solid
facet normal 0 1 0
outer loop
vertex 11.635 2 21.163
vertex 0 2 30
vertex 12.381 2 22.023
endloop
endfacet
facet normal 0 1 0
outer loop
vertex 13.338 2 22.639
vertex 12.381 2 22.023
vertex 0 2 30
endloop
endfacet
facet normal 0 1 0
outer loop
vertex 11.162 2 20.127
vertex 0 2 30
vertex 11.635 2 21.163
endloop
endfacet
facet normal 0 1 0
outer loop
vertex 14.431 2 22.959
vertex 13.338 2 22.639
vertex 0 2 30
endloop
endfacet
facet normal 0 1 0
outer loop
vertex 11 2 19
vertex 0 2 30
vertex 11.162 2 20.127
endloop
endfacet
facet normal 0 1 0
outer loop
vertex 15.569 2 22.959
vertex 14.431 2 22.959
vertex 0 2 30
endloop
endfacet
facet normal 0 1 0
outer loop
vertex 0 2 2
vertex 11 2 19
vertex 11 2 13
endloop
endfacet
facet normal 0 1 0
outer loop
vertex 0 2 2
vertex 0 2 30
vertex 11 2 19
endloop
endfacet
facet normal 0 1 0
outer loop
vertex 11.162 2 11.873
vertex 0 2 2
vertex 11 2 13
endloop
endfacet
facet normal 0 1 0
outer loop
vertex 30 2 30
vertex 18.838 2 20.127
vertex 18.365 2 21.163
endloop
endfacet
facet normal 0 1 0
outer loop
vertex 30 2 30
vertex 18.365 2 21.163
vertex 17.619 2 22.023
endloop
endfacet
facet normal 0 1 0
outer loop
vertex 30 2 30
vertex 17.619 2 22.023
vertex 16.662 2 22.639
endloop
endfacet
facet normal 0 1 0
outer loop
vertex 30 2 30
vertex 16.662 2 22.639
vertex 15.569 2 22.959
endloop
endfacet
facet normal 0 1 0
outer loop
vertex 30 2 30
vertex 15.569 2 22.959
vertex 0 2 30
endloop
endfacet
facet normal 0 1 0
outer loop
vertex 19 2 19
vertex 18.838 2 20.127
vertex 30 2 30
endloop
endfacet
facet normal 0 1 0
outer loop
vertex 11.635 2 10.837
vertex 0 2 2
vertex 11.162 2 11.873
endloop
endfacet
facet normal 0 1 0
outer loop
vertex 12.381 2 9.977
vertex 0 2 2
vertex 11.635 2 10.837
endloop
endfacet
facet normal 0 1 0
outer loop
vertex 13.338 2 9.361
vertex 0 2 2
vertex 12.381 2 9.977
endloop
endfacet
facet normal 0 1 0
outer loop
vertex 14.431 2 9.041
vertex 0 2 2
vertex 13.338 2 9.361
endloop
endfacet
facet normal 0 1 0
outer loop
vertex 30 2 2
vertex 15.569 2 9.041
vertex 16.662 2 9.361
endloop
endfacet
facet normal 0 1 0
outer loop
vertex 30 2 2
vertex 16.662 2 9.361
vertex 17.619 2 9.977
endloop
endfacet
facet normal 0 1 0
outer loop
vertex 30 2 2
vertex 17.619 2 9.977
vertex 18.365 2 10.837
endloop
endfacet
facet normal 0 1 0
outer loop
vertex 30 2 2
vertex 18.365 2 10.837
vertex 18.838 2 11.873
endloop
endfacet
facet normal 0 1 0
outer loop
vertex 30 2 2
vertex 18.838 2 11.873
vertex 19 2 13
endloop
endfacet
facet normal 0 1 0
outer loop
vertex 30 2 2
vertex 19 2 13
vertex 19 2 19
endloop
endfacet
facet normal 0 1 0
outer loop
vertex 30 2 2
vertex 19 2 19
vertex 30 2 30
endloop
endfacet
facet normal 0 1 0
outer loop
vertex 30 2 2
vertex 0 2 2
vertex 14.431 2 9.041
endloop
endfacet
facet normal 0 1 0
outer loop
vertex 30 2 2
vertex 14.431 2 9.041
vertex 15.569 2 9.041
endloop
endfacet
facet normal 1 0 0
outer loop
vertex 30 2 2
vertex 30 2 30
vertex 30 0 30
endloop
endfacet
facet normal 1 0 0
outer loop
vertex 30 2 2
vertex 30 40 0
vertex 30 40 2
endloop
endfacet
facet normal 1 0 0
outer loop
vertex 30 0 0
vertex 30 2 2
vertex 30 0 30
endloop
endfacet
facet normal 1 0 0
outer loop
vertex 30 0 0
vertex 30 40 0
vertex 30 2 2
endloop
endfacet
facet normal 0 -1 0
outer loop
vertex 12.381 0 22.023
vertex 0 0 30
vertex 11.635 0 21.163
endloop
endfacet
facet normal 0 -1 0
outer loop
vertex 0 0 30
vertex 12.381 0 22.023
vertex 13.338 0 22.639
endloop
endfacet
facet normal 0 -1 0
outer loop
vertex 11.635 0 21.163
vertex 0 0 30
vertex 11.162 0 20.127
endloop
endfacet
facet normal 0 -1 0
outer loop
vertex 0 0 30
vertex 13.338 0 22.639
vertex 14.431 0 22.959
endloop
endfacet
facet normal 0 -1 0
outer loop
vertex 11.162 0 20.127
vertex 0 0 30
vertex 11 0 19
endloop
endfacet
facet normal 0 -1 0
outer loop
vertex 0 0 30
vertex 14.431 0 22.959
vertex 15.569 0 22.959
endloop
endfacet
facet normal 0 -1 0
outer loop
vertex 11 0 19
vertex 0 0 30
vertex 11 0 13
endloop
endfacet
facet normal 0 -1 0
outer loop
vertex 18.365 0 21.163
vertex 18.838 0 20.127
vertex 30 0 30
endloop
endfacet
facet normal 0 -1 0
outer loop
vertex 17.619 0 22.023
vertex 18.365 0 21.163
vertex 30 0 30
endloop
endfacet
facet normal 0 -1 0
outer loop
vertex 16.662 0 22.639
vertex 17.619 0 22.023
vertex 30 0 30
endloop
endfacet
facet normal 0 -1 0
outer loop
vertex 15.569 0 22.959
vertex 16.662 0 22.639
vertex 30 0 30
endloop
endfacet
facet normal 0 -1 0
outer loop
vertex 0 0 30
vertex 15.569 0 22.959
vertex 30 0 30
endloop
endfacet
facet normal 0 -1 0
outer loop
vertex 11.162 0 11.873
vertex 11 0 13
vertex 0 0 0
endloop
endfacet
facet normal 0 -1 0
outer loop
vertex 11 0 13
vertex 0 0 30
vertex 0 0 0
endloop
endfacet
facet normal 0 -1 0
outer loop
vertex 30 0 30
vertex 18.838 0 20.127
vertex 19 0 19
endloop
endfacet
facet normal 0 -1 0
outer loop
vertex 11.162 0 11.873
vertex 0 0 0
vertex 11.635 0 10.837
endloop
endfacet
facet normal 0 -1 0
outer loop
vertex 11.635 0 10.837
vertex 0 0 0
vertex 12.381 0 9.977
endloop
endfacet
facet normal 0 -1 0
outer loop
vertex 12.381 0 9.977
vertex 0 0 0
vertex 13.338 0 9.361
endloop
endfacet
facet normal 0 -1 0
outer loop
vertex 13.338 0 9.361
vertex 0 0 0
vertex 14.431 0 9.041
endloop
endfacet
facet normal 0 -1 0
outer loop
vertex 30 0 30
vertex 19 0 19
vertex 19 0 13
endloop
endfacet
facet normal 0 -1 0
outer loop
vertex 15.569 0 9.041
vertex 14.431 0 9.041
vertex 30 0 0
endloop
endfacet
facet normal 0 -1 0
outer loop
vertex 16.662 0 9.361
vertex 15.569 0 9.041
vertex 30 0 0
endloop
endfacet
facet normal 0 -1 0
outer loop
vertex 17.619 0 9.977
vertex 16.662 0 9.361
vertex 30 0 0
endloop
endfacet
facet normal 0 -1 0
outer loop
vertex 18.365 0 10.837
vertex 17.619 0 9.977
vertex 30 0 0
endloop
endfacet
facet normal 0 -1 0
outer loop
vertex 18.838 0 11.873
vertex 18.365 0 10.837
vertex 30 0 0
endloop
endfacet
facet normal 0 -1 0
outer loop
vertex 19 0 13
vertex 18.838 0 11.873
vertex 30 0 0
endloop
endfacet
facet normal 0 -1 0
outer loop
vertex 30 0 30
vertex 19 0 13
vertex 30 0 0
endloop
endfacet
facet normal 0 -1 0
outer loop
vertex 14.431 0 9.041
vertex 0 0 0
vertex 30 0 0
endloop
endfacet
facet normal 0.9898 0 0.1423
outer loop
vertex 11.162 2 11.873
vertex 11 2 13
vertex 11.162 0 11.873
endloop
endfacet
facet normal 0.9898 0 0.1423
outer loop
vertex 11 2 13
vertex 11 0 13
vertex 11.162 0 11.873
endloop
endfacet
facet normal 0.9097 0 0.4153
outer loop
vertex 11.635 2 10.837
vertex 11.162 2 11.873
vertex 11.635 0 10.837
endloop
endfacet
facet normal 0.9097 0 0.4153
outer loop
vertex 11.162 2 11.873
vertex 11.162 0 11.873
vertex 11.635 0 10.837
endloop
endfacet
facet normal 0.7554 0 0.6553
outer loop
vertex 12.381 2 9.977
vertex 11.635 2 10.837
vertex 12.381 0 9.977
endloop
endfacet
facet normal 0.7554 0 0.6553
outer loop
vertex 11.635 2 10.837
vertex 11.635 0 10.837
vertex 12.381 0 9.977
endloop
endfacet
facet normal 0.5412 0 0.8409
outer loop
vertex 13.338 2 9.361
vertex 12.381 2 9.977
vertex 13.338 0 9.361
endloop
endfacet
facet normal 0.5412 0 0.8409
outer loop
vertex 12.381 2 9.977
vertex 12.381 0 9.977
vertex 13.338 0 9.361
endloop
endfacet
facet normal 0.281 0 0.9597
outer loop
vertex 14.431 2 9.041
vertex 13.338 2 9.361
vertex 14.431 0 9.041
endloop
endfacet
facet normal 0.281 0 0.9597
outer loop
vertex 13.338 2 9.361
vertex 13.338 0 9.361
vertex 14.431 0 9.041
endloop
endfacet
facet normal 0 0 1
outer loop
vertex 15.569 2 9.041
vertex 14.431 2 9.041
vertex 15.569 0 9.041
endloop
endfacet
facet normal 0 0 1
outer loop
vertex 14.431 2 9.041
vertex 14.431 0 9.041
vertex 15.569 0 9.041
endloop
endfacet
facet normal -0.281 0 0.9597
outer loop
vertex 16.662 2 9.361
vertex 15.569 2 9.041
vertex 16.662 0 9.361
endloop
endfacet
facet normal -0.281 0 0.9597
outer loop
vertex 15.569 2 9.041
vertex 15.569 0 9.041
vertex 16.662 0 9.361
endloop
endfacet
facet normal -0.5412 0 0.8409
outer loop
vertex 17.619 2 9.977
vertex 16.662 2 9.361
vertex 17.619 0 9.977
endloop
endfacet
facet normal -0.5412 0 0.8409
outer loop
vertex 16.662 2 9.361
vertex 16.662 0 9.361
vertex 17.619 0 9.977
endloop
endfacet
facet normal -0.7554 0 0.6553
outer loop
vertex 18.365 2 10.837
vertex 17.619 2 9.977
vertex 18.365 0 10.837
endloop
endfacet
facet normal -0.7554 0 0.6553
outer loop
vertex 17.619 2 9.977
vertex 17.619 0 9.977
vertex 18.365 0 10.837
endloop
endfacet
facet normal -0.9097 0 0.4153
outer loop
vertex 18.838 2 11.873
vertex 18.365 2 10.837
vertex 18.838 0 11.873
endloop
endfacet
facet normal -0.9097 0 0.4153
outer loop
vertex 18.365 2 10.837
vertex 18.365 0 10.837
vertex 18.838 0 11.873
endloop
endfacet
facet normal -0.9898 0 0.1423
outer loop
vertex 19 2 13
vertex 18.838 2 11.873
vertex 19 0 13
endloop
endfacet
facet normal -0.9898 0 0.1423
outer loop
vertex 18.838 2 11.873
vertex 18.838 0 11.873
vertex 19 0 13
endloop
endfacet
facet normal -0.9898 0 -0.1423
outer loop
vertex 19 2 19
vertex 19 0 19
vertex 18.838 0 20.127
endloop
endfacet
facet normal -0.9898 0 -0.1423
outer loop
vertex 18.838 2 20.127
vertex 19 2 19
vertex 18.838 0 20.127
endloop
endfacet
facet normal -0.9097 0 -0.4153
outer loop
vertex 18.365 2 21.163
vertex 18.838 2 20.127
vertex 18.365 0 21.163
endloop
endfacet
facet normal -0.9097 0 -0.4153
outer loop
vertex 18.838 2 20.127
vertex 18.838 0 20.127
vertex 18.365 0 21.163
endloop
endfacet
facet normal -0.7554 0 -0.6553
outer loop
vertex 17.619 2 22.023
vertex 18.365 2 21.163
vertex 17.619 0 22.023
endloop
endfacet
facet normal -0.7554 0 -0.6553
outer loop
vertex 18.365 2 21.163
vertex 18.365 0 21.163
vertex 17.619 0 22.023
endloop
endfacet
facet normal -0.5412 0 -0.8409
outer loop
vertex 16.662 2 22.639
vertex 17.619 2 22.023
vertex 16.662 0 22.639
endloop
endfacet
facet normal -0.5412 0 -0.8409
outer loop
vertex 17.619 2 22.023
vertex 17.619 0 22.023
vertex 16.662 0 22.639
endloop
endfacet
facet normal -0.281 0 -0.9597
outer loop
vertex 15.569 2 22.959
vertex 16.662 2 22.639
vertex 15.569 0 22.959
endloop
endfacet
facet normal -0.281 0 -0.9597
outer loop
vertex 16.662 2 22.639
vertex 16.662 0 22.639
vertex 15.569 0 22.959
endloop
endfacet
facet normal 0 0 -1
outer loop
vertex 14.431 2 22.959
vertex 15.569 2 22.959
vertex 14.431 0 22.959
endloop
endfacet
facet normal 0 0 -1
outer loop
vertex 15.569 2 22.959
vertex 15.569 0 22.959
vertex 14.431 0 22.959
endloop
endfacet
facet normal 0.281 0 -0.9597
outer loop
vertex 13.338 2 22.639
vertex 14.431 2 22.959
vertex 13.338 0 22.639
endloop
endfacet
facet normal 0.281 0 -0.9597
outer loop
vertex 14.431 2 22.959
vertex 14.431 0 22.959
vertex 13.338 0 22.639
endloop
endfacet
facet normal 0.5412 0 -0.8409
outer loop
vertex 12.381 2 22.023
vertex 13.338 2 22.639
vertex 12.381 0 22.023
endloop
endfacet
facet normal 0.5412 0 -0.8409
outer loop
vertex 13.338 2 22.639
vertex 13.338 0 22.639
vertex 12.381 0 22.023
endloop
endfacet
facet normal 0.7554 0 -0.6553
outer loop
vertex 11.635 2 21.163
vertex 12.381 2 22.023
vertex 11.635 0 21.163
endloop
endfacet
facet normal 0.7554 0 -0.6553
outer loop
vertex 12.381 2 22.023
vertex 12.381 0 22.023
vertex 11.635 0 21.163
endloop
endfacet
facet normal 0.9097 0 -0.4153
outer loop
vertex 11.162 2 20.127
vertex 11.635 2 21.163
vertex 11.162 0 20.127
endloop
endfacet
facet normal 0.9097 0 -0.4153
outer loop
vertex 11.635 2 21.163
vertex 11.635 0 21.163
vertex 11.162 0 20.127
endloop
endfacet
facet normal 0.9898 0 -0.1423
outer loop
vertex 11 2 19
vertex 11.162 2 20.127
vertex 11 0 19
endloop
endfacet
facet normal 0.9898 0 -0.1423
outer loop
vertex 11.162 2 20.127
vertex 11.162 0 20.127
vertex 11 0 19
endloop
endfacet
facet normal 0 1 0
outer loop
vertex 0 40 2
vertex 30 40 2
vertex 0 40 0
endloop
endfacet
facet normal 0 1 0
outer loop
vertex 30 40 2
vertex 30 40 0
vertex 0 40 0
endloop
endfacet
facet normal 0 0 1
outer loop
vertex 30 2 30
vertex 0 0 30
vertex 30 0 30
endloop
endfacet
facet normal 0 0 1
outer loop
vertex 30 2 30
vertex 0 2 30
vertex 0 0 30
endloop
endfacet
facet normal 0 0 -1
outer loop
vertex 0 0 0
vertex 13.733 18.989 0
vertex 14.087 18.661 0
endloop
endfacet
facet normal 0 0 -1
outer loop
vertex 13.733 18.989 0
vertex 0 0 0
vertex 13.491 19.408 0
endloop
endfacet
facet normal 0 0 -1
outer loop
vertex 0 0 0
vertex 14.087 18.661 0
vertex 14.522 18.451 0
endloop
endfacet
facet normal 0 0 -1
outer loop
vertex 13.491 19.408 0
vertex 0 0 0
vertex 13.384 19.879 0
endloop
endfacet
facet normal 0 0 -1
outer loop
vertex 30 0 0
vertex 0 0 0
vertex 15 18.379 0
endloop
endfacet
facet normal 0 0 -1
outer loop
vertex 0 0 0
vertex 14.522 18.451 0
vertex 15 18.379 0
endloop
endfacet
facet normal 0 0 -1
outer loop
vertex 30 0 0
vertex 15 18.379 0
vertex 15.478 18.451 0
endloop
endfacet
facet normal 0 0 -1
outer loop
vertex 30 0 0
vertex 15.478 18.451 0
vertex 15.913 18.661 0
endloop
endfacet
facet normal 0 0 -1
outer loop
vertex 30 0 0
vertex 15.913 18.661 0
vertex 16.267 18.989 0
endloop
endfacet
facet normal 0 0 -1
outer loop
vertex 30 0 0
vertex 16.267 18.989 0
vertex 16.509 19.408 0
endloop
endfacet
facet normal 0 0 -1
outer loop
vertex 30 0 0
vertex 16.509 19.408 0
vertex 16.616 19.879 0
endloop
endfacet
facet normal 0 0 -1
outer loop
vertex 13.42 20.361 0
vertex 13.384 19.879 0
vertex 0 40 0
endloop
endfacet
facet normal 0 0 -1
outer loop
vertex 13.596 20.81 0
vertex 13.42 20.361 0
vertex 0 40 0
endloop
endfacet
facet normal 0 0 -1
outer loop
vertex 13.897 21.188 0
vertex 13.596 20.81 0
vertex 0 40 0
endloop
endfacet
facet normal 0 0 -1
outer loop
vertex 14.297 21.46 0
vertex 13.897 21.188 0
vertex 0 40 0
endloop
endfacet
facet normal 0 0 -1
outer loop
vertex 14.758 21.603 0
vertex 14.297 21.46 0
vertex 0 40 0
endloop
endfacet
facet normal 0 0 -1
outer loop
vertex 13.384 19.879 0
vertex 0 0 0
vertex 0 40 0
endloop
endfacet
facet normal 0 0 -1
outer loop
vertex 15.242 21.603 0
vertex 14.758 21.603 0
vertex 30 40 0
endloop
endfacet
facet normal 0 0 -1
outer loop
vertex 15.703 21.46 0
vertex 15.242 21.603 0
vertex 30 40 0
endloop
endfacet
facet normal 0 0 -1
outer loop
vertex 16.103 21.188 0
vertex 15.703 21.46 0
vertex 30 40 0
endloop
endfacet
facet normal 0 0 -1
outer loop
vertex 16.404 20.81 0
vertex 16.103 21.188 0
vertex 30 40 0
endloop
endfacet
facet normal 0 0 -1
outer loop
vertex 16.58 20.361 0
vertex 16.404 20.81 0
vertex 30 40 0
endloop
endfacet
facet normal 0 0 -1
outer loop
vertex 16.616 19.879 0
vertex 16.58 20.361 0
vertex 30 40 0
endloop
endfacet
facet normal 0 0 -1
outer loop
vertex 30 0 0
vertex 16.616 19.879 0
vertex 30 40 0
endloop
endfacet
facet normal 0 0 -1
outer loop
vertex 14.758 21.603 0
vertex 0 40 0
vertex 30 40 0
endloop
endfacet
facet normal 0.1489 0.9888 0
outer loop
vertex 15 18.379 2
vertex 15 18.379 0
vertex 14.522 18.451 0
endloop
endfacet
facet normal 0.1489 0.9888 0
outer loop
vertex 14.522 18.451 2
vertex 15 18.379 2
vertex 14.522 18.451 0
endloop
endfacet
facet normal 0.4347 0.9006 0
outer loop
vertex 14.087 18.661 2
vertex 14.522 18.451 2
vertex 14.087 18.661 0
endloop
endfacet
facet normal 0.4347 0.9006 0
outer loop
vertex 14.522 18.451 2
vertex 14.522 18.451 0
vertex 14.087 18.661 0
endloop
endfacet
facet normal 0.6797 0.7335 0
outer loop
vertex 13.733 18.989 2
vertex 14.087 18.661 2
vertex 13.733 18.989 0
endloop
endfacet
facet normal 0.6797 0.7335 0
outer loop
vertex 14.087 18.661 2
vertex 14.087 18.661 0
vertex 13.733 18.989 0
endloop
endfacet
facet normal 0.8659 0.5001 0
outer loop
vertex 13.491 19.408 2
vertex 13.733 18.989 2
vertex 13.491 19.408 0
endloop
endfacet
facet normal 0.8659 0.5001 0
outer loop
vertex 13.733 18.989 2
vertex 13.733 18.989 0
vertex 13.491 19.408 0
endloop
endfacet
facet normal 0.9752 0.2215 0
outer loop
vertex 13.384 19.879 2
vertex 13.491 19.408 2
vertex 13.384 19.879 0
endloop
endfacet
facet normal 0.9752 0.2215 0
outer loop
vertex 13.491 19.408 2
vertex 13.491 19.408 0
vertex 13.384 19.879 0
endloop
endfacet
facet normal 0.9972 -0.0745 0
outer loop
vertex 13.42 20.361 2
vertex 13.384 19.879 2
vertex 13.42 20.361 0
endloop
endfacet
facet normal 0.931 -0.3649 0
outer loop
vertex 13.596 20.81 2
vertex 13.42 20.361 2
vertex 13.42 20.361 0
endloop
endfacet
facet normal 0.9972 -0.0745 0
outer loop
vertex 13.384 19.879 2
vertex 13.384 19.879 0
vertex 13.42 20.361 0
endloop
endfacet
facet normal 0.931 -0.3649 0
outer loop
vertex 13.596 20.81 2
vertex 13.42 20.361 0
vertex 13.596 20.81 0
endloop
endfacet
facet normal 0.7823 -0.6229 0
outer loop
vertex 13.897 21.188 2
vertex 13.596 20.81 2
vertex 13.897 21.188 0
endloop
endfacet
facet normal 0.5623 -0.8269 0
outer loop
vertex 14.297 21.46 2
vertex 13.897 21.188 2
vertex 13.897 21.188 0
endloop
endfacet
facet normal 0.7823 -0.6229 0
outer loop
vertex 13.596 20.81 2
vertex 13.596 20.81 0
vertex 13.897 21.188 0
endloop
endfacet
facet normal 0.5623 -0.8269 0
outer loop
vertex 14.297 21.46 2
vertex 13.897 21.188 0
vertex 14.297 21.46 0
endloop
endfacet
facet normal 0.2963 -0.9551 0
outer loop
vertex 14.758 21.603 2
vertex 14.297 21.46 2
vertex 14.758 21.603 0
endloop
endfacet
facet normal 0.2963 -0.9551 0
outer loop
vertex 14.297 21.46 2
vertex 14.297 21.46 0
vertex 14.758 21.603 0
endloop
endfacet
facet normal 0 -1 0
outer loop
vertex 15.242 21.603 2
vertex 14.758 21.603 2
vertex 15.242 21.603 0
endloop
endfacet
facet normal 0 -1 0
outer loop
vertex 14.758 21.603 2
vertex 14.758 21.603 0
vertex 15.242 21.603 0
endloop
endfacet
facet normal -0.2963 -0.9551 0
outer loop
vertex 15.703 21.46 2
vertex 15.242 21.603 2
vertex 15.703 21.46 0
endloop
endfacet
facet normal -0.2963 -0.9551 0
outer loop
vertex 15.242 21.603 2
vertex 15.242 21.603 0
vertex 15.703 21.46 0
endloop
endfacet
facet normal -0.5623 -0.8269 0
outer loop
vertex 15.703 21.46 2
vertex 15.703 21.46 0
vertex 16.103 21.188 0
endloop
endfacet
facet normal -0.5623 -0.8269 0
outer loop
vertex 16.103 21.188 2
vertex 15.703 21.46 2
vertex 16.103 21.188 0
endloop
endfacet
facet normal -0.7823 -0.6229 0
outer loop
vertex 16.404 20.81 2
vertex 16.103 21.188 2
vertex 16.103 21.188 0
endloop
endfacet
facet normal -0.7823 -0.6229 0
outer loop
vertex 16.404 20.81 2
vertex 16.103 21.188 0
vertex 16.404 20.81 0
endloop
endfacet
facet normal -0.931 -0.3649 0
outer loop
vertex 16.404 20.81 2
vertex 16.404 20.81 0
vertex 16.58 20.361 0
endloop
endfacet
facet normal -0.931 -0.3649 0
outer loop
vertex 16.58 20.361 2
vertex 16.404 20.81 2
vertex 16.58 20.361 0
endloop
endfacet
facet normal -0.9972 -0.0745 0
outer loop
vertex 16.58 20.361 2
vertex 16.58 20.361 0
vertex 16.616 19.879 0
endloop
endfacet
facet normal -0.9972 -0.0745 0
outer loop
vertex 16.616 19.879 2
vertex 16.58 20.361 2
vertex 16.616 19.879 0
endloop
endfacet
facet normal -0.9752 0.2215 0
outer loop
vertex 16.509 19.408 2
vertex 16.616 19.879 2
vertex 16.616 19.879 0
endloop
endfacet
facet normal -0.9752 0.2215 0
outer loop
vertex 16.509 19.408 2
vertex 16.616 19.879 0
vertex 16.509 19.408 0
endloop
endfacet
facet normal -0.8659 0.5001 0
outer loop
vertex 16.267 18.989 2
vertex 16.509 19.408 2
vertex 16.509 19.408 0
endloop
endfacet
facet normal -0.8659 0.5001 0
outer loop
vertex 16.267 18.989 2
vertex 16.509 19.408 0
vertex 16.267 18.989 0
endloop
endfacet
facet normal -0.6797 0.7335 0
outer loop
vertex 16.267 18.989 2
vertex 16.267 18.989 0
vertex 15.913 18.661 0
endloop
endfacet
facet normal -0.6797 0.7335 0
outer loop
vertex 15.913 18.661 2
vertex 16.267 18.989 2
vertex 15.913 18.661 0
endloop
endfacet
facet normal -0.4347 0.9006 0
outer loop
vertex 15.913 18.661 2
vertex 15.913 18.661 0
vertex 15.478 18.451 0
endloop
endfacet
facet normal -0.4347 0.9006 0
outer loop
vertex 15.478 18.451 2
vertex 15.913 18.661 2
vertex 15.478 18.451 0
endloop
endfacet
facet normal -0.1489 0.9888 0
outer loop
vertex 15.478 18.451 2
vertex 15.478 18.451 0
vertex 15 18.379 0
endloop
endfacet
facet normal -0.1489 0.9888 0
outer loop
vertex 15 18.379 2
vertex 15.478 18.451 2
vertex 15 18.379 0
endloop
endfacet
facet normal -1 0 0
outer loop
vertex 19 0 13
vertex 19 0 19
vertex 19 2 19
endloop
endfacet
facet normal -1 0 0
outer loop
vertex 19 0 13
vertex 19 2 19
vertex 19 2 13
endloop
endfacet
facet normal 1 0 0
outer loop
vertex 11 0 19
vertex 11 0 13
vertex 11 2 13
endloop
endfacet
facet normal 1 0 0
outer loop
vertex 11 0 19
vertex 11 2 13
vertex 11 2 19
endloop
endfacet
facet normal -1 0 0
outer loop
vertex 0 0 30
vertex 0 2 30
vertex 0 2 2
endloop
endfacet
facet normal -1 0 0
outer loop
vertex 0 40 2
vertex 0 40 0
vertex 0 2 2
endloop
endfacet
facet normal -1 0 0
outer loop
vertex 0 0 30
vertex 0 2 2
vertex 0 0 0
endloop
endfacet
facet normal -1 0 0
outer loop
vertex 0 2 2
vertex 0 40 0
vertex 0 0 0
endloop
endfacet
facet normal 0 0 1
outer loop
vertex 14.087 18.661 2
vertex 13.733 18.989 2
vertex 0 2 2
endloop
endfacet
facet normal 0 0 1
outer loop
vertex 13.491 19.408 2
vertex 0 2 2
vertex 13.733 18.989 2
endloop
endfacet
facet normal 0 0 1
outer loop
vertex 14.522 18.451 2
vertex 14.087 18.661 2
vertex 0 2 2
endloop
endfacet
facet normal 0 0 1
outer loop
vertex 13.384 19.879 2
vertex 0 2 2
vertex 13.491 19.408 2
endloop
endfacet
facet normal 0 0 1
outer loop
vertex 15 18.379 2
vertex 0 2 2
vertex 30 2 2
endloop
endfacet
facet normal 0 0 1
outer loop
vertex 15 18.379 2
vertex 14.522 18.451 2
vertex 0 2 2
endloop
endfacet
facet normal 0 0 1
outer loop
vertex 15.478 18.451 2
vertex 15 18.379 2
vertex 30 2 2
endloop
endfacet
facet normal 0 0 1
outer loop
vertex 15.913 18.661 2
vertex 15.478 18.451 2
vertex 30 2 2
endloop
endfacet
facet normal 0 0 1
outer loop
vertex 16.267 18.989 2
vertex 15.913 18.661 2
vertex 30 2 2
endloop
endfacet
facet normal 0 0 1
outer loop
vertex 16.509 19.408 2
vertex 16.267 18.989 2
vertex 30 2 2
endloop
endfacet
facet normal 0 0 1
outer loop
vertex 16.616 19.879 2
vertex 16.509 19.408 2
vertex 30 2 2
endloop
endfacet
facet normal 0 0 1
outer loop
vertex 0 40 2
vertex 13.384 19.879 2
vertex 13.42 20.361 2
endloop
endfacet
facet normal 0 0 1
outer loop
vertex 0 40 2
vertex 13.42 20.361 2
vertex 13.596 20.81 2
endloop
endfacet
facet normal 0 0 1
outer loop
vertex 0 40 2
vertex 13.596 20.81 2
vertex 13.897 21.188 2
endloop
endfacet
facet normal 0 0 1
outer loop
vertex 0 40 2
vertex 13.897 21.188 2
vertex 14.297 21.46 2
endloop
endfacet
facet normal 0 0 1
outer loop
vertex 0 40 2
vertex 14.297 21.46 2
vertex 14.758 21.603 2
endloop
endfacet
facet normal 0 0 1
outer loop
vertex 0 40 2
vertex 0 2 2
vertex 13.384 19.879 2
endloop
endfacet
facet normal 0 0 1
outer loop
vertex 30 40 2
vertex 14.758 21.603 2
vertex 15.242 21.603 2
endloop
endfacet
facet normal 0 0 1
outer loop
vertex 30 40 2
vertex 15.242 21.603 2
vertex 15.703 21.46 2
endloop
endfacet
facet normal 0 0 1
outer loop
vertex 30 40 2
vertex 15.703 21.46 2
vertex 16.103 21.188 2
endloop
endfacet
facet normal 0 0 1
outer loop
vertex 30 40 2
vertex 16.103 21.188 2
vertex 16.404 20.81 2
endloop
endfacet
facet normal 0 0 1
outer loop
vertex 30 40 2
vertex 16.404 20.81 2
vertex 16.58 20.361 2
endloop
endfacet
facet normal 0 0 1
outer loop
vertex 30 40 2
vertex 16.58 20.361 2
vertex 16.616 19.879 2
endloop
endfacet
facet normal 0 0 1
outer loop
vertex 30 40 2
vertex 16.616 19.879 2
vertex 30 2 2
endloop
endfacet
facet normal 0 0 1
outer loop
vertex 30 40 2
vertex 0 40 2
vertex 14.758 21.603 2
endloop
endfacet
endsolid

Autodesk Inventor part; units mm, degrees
ref_plane "YZ Plane" through (0, 0, 0) normal (1, 0, 0) x (0, 1, 0)
ref_plane "XZ Plane" through (0, 0, 0) normal (0, 1, 0) x (-1, 0, 0)
ref_plane "XY Plane" through (0, 0, 0) normal (0, 0, 1) x (1, 0, 0)
sketch "スケッチ1" plane through (0, 0, 0) normal (0, 0, 1) x (1, 0, 0)
  line L0 (0, 0) -> (30, 0)
  line L1 (30, 0) -> (30, 40)
  line L2 (30, 40) -> (0, 40)
  line L3 (0, 40) -> (0, 0)
  point P0 (15, 20)
  dimension "d0" = 30
  dimension "d1" = 40
  dimension "d2" = 20
  dimension "d3" = 15
extrude "押し出し1" add sketch "スケッチ1" along normal blind 2
sketch "スケッチ2" plane through (0, 0, 2) normal (0, 0, 1) x (1, 0, 0)
  line L0 (30, 0) -> (30, 40) projected
  line L1 (30, 40) -> (0, 40) projected
  point P0 (0, 0)
  point P1 (15, 20)
  dimension "d6" = 15
  dimension "d7" = 20
hole "穴1" at (15, 20, 2) direction (0, 0, -1) diameter 3.242 end through all thread size "M4x0.7" class "6H" standard "ISO Metric profile"
sketch "スケッチ5" plane through (0, 0, 2) normal (0, 0, 1) x (1, 0, 0)
  line L0 (0, 40) -> (0, 0) projected
  line L1 (0, 0) -> (30, 0) projected
  line L2 (0, 2) -> (30, 2)
  line L3 (30, 2) -> (30, 0)
  line L4 (30, 0) -> (0, 0)
  line L5 (0, 0) -> (0, 2)
  dimension "d15" = 2
  dimension "d16" = 30
extrude "押し出し2" add sketch "スケッチ5" along normal blind 28
sketch "スケッチ10" plane through (0, 0, 0) normal (0, -1, 0) x (1, 0, 0)
  line L0 (11, 19) -> (19, 19)
  line L1 (19, 19) -> (19, 13)
  line L2 (19, 13) -> (11, 13)
  line L3 (11, 13) -> (11, 19)
  line L4 (30, 0) -> (30, 30) projected
  line L5 (0, 30) -> (30, 30) projected
  point P0 (0, 0)
  dimension "d32" = 8
  dimension "d33" = 11
  dimension "d34" = 11
  dimension "d35" = 6
extrude "押し出し6" cut sketch "スケッチ10" against normal blind 10
sketch "スケッチ11" plane through (0, 0, 0) normal (0, -1, 0) x (1, 0, 0)
  line L0 (11, 19) -> (19, 19) projected
  circle A0 centre (15, 19) radius 4
  line L1 (11, 13) -> (19, 13) projected
  circle A1 centre (15, 13) radius 4
  point P0 (0, 0)
  point P1 (12.3542, 16)
  point P2 (17.6458, 16)
extrude "押し出し7" cut sketch "スケッチ11" against normal blind 10 contours A0 L0 | A0 A1 L1
sketch "スケッチ12" plane through (0, 0, 0) normal (0, -1, 0) x (1, 0, 0)
  line L0 (11, 13) -> (19, 13) projected
  circle A0 centre (15, 13) radius 4
  point P0 (0, 0)
extrude "押し出し8" cut sketch "スケッチ12" against normal blind 10 contours L0 A0 picked at (13.7054, 12.6809)
properties part number "規定課題1"
